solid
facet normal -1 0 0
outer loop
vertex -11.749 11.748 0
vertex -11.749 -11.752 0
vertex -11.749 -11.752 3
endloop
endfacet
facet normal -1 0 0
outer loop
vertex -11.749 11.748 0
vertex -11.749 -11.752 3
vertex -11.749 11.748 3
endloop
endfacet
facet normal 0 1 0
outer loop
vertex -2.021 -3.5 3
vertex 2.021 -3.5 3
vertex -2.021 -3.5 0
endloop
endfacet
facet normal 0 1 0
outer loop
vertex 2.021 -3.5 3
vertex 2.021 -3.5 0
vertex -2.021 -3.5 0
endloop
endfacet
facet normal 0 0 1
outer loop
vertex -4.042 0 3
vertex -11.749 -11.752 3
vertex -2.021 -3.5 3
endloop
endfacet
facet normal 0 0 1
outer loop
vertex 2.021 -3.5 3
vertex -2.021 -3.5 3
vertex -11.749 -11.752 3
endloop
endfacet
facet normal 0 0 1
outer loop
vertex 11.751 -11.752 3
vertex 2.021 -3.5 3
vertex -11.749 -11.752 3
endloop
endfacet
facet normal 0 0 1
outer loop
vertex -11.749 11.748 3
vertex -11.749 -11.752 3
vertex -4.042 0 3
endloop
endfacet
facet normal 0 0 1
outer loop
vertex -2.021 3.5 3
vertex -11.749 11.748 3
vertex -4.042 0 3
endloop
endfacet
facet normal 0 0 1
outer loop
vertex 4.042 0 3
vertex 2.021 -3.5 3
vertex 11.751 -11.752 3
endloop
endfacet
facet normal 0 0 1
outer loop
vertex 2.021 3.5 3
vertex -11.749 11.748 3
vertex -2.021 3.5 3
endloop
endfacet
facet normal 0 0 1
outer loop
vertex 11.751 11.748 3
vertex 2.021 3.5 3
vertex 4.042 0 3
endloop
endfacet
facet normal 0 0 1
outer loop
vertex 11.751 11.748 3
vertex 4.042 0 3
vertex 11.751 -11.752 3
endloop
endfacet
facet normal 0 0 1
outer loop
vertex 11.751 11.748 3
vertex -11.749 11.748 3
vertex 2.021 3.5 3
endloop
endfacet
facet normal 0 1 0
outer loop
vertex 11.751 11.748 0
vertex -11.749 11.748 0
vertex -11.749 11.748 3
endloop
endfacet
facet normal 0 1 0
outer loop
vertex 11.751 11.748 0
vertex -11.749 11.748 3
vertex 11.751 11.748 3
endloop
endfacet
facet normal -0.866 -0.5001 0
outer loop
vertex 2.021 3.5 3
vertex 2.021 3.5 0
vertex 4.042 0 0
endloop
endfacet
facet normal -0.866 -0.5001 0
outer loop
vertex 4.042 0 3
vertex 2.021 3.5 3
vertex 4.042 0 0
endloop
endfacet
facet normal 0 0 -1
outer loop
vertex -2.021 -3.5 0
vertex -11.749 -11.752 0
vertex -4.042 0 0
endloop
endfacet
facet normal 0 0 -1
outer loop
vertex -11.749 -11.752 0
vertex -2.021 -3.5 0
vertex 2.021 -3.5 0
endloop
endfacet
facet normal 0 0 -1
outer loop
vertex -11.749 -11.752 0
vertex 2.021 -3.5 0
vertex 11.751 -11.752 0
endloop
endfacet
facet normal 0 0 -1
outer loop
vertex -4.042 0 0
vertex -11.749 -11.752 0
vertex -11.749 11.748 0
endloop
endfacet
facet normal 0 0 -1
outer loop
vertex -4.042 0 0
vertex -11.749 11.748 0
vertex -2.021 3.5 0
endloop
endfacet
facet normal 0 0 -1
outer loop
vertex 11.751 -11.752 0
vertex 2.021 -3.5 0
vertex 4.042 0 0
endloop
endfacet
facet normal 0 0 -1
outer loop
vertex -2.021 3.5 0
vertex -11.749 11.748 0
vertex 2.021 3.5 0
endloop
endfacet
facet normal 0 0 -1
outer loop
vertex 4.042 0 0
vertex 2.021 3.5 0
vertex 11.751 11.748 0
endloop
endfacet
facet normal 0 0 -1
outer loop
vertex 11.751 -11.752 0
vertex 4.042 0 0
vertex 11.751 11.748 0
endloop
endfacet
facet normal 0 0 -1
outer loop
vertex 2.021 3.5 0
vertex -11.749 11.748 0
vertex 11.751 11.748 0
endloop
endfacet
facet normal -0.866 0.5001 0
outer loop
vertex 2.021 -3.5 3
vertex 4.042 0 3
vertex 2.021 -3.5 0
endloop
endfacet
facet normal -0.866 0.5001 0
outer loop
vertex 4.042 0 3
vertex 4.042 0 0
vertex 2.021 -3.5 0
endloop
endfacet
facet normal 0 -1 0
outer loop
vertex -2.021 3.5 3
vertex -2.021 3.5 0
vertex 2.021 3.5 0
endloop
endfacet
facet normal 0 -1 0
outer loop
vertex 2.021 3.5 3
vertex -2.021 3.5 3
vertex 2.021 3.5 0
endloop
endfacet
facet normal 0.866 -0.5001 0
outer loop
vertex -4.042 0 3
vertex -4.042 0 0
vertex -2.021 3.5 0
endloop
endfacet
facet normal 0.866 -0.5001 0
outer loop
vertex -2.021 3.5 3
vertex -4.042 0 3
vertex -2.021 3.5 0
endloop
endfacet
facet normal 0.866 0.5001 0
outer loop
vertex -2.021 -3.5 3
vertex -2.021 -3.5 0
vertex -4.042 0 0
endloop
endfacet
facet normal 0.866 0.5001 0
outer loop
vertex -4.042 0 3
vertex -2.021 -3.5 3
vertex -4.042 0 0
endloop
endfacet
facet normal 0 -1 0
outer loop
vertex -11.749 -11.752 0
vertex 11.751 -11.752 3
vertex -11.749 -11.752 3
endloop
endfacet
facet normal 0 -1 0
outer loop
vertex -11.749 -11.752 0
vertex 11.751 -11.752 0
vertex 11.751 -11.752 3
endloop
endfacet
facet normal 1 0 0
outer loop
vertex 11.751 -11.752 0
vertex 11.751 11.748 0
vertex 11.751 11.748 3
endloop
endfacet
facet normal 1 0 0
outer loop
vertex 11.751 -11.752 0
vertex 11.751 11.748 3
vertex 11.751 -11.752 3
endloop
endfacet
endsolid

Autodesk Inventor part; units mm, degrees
ref_plane "YZ Plane" through (0, 0, 0) normal (1, 0, 0) x (0, 1, 0)
ref_plane "XZ Plane" through (0, 0, 0) normal (0, 1, 0) x (-1, 0, 0)
ref_plane "XY Plane" through (0, 0, 0) normal (0, 0, 1) x (1, 0, 0)
sketch "Sketch1" plane through (0, 0, 0) normal (0, 0, 1) x (1, 0, 0)
  line L0 (-2.0207, 3.5005) -> (2.0207, 3.5005)
  line L1 (2.0207, 3.5005) -> (4.0415, 0.0005)
  line L2 (-4.0415, 0.0005) -> (-2.0207, 3.5005)
  line L3 (-2.0207, -3.4995) -> (-4.0415, 0.0005)
  line L4 (4.0415, 0.0005) -> (2.0207, -3.4995)
  line L5 (2.0207, -3.4995) -> (-2.0207, -3.4995)
  line L6 (-11.749, 11.7485) -> (11.751, 11.7485)
  line L7 (11.751, 11.7485) -> (11.751, -11.7515)
  line L8 (11.751, -11.7515) -> (-11.749, -11.7515)
  line L9 (-11.749, -11.7515) -> (-11.749, 11.7485)
  point P0 (0, 0)
  point P1 (0.001, -0.0015)
  dimension "d7" = 23.5
  dimension "d8" = 23.5
extrude "Extrusion1" add sketch "Sketch1" along normal blind 3
properties part number "hex slot holder" material "Gold"
